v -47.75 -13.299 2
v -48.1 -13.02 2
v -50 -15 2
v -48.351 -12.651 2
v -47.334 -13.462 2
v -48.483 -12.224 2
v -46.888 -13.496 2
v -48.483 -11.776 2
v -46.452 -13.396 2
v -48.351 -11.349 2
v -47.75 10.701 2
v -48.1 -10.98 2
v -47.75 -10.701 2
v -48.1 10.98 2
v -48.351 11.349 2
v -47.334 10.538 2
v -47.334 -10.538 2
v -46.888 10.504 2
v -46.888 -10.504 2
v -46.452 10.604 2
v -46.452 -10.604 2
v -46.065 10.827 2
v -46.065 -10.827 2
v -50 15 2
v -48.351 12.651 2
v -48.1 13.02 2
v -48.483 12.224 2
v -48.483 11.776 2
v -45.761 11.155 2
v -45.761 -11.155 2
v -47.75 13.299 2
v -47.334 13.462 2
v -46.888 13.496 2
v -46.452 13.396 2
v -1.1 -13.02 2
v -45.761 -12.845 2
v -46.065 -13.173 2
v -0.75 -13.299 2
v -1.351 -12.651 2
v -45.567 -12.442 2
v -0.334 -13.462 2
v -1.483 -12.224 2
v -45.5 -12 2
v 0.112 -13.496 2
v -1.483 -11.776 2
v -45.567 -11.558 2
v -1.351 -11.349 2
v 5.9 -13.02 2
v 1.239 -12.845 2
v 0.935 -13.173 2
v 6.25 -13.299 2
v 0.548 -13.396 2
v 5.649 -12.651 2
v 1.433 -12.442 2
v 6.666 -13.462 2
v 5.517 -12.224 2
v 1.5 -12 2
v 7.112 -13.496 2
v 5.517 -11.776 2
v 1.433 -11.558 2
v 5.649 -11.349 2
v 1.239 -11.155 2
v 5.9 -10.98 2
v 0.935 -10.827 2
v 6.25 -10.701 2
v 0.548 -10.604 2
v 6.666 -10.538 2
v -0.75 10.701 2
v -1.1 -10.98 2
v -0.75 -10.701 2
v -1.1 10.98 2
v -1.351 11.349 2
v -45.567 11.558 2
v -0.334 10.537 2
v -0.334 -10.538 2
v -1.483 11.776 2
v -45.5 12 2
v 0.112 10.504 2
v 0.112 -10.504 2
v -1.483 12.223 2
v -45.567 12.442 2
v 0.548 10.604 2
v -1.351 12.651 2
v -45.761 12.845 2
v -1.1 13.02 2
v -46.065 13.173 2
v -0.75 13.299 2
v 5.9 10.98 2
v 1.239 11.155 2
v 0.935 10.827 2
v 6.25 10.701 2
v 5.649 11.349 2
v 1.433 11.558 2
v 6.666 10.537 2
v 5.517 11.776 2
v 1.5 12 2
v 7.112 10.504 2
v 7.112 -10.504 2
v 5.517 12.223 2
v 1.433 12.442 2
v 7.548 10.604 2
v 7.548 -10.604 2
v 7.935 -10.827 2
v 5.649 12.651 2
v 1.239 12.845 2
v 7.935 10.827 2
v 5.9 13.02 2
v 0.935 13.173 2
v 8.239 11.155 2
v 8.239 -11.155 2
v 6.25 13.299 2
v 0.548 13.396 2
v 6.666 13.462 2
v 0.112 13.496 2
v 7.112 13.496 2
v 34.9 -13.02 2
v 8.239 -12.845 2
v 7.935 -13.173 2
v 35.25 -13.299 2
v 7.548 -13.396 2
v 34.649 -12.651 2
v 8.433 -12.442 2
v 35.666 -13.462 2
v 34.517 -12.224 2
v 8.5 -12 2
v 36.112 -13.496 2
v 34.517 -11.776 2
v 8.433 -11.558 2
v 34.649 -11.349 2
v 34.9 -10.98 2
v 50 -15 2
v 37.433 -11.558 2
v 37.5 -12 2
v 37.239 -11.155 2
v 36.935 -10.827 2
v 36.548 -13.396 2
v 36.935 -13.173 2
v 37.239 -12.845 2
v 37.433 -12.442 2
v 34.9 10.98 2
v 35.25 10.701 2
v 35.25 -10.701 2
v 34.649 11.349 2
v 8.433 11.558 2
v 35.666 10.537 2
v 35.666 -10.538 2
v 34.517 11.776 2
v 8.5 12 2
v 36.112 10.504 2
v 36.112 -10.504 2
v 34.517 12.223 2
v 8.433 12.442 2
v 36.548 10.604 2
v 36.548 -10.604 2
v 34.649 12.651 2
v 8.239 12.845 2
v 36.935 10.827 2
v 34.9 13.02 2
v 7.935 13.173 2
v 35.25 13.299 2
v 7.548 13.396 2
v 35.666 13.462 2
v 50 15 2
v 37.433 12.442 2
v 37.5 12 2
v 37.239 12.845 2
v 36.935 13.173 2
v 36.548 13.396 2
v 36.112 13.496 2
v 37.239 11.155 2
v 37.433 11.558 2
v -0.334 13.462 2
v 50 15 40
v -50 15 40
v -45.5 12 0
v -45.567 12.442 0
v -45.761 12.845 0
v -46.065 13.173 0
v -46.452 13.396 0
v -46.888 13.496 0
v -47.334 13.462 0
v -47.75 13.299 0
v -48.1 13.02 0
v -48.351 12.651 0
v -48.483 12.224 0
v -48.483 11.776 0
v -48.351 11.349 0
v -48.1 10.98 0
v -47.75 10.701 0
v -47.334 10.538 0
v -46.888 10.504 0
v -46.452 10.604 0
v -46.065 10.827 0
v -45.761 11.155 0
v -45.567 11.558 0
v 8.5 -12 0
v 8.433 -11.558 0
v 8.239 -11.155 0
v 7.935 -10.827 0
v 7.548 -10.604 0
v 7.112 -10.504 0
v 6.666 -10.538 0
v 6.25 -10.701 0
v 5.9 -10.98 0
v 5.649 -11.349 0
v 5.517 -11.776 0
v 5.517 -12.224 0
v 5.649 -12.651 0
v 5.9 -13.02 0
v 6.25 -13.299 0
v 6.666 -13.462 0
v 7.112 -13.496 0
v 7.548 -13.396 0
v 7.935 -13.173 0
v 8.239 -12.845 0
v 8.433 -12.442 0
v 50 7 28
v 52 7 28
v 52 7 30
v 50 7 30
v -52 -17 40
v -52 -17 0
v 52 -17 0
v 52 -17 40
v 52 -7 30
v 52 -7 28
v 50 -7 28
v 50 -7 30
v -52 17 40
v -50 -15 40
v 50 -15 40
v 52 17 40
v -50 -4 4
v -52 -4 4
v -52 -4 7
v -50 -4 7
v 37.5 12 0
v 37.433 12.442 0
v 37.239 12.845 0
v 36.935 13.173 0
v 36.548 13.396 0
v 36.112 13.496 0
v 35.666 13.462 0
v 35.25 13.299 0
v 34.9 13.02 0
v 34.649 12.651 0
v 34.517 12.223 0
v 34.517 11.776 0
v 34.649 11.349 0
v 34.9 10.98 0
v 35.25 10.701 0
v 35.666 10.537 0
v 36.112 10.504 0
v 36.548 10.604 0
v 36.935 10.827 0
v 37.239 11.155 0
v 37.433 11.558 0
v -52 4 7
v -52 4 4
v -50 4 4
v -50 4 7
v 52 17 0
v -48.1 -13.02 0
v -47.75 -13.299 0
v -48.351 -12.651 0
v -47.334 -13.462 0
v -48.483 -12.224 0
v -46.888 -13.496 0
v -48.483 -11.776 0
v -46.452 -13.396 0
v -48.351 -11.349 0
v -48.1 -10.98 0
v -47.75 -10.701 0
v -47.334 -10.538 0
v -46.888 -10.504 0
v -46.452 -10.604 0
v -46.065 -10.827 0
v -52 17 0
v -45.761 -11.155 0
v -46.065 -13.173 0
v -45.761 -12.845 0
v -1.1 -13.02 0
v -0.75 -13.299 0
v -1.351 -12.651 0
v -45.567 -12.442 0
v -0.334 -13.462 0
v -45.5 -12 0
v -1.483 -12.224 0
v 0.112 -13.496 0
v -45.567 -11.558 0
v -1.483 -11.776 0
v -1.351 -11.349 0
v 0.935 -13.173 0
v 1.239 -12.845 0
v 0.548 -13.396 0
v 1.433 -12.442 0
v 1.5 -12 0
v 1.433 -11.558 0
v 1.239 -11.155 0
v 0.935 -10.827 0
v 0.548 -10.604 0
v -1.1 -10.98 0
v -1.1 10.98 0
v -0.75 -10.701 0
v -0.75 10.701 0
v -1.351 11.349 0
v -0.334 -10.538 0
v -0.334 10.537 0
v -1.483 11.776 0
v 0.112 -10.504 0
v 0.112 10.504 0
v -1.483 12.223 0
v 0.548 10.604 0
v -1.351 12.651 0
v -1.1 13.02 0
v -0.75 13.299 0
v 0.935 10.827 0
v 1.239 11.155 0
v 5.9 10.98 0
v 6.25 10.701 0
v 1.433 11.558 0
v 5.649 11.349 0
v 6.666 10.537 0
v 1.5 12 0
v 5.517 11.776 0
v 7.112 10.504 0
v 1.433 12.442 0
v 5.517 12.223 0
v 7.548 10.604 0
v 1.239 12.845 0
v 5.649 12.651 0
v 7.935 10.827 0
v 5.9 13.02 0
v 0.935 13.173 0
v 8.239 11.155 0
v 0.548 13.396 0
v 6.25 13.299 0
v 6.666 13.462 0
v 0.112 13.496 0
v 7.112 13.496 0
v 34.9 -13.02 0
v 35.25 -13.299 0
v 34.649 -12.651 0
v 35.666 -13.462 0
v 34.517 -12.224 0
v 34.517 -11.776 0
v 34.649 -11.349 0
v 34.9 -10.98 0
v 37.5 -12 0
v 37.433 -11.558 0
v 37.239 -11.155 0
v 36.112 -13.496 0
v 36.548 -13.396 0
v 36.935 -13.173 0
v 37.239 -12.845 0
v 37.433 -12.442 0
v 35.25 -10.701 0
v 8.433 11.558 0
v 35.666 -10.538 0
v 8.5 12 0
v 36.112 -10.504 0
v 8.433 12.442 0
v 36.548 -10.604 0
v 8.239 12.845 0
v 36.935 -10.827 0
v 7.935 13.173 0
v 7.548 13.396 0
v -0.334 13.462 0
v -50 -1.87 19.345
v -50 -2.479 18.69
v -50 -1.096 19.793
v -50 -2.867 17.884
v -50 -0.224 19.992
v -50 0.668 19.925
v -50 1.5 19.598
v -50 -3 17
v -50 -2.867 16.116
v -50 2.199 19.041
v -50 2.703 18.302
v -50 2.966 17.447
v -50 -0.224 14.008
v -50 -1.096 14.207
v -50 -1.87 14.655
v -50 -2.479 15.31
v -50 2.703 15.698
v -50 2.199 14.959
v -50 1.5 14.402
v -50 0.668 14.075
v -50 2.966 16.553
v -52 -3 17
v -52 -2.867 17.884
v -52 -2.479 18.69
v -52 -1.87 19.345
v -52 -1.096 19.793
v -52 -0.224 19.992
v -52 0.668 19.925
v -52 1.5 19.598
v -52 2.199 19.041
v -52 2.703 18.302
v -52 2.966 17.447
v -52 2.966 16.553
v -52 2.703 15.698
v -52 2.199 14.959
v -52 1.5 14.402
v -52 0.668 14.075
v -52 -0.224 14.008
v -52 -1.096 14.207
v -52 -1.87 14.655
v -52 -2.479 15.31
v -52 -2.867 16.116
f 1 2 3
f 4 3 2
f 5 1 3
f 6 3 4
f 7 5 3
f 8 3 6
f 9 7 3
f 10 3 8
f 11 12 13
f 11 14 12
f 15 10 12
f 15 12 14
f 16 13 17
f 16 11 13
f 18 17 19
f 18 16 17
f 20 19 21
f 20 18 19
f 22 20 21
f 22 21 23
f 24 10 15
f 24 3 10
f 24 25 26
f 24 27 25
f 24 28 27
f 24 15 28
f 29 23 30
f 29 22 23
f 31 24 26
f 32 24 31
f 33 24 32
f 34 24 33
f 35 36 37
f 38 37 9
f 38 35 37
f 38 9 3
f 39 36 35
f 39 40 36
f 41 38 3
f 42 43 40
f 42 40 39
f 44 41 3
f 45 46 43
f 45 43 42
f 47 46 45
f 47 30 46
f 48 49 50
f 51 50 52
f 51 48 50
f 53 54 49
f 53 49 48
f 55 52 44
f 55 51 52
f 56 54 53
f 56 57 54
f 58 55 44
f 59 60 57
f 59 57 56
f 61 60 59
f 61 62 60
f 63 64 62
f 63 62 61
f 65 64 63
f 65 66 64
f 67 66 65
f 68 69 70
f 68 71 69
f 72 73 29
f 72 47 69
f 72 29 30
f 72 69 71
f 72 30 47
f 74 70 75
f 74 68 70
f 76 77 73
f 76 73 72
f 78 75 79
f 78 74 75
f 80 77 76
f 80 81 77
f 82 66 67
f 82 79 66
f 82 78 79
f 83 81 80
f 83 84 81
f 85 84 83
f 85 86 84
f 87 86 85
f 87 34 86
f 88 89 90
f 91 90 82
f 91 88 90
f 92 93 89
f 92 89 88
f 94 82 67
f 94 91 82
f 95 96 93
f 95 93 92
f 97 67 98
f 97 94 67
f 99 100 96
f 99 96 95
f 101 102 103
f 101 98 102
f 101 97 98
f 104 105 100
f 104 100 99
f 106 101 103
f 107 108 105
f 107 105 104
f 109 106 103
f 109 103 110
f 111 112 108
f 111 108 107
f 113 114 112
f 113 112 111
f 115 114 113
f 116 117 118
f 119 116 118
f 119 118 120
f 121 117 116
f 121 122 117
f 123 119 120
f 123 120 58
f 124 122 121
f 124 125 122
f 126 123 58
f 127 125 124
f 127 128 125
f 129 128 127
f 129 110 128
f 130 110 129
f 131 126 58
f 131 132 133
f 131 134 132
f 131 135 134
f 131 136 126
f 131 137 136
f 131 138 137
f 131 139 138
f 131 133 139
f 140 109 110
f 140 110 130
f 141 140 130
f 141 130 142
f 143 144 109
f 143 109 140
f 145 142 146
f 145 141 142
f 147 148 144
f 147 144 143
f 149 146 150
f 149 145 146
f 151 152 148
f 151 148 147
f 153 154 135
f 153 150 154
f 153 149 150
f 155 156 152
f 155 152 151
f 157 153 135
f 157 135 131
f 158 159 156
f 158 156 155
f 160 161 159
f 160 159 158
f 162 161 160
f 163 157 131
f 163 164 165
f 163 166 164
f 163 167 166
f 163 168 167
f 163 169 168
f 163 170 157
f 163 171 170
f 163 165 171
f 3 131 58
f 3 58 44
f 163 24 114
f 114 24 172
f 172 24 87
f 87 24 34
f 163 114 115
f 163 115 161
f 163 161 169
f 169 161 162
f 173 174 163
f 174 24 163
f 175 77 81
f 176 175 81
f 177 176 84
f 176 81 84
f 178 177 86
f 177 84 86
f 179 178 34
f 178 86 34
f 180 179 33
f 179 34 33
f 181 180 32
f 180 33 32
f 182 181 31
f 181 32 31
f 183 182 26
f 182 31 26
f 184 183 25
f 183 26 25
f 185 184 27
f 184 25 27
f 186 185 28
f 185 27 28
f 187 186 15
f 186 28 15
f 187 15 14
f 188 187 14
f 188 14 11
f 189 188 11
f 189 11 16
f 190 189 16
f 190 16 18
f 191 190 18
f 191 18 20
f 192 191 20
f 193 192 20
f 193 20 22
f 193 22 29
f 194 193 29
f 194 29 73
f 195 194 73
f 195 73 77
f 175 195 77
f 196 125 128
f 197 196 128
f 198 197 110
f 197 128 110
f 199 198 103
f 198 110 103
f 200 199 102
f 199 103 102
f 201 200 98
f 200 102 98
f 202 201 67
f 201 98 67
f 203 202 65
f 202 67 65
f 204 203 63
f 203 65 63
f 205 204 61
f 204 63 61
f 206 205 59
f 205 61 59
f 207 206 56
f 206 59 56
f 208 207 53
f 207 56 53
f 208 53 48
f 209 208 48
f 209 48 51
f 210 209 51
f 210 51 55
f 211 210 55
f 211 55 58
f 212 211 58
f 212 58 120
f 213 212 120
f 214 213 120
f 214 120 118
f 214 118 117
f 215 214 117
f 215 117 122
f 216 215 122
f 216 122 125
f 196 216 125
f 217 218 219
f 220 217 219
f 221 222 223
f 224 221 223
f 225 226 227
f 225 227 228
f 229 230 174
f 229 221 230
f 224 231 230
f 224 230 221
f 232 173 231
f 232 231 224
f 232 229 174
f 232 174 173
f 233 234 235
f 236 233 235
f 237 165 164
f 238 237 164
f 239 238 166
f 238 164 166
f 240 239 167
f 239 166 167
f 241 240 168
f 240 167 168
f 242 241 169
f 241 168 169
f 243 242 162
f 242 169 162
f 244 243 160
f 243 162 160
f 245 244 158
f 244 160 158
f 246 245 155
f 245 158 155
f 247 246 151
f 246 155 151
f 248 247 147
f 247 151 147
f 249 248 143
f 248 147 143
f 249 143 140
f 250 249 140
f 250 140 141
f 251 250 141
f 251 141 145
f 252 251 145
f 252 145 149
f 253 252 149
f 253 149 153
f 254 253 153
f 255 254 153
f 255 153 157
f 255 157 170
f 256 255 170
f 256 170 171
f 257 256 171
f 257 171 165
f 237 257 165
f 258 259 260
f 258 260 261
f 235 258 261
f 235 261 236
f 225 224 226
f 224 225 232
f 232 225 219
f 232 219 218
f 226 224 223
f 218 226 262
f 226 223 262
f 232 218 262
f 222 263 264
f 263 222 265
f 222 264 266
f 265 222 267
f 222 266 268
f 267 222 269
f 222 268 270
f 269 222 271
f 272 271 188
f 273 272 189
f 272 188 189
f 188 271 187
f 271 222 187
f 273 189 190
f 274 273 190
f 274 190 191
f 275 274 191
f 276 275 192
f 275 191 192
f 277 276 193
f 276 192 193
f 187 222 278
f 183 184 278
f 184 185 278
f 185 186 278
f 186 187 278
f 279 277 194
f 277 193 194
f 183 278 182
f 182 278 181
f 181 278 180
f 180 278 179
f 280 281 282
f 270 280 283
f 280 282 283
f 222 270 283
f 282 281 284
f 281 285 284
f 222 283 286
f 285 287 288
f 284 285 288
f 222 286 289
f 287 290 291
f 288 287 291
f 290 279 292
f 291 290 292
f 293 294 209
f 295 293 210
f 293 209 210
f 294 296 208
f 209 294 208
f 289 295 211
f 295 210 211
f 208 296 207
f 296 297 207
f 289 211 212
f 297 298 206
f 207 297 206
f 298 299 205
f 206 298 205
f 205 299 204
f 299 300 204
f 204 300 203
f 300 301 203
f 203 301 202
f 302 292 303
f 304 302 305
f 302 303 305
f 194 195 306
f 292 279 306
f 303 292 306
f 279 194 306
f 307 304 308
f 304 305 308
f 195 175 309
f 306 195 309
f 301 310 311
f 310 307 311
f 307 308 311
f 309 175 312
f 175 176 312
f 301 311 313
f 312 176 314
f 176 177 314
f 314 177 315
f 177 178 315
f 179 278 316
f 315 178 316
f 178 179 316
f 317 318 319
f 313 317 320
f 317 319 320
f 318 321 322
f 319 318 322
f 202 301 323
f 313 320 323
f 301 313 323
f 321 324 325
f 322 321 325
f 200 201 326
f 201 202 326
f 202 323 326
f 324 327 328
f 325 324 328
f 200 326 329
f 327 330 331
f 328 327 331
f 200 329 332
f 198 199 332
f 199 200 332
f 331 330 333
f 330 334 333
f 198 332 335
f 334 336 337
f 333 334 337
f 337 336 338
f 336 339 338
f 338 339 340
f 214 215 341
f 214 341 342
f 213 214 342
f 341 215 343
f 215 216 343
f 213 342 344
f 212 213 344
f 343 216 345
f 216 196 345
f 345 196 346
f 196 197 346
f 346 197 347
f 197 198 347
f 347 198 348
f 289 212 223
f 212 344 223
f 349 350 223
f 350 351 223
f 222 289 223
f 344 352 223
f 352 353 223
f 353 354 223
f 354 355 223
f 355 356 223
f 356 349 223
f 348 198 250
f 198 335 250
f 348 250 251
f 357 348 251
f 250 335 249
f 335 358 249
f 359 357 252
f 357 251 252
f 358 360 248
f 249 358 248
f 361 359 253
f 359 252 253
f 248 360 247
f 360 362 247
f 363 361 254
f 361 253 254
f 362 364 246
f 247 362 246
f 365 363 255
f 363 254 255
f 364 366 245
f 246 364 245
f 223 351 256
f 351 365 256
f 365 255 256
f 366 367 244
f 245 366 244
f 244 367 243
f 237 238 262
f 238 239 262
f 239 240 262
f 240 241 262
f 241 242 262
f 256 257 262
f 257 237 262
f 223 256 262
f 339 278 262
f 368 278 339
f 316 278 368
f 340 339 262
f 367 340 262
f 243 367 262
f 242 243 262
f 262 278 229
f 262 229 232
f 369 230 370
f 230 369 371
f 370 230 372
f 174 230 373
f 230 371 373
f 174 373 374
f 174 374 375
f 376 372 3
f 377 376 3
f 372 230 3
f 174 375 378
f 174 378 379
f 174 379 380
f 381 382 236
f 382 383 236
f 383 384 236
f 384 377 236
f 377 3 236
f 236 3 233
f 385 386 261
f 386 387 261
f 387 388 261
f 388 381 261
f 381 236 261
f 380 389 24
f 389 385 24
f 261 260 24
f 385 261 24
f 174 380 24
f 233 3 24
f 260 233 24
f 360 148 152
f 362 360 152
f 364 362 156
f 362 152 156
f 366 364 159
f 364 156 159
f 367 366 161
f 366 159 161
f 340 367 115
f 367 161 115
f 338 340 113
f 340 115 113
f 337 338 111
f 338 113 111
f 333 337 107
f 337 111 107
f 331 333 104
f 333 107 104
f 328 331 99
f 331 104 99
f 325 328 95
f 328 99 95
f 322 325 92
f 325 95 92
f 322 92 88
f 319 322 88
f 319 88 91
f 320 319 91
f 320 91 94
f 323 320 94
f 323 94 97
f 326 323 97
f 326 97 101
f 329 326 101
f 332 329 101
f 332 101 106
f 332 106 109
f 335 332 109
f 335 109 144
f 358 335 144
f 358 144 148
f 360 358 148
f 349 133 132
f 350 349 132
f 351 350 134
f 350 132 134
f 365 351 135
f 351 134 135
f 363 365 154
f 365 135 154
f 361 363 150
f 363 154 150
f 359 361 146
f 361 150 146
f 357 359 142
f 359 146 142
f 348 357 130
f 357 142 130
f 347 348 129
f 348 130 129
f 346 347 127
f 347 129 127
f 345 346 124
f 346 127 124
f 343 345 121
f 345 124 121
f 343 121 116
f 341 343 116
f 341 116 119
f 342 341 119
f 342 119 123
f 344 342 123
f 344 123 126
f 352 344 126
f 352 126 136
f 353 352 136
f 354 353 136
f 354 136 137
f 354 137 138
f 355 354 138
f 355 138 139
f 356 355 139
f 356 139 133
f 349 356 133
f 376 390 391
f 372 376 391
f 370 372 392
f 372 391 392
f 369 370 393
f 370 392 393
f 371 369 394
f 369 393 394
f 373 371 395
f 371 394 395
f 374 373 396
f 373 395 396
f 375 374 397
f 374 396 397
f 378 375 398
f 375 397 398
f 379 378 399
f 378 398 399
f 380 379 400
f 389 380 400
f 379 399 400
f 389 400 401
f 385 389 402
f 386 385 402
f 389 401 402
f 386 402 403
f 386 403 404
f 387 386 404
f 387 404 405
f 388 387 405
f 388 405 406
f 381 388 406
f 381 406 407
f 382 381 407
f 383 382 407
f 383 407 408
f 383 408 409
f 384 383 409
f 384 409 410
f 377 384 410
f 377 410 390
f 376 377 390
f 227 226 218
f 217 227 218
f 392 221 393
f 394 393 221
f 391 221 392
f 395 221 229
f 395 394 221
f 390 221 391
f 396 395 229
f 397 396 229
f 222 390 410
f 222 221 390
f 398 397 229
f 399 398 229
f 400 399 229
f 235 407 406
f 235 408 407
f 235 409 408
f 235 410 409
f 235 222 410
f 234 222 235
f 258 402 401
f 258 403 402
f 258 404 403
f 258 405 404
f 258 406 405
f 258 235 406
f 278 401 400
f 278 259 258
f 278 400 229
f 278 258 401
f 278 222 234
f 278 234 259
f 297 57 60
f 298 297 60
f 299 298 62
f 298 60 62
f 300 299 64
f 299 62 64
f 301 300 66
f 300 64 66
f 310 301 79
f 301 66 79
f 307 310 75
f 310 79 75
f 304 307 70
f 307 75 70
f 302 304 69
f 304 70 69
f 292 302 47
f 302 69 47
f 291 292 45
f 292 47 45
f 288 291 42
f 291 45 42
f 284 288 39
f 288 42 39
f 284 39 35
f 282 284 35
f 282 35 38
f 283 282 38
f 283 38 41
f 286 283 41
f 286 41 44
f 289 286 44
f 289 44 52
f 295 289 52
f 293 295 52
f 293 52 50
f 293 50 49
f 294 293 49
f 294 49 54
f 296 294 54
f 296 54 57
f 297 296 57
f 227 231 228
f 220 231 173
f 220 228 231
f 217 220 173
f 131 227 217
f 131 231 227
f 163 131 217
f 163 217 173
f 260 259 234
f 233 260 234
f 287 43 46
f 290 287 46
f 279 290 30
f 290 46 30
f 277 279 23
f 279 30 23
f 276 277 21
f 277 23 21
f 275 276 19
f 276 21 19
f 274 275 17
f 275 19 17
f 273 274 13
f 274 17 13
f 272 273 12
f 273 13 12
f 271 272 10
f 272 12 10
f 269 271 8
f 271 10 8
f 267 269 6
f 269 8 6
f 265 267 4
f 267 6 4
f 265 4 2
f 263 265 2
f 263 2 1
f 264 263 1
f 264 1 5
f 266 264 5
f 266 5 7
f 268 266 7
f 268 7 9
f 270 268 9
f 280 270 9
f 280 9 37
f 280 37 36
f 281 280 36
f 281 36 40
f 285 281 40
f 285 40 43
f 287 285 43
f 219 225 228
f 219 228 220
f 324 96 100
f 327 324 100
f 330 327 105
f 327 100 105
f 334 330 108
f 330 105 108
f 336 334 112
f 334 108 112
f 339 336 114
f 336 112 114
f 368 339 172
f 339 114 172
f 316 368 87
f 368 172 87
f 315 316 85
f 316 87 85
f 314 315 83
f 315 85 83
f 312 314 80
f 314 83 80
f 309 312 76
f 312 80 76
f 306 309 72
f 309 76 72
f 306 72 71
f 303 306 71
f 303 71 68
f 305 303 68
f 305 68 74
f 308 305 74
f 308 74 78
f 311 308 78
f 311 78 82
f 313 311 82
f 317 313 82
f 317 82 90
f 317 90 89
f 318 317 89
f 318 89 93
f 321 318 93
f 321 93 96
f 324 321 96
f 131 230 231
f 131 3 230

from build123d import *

# Parameters (mm, degrees)
PAD_DEPTH       = 3
SKETCH001_R     = 1.5
POCKET_DEPTH    = 5
SKETCH002_W     = 104
SKETCH002_H     = 34
PAD001_DEPTH    = 40
THICKNESS_T     = -2
POCKET001_DEPTH = 5
SKETCH003_R     = 3
SKETCH003_W     = 8
SKETCH003_H     = 3
POCKET002_DEPTH = 5
SKETCH004_W     = 14
SKETCH004_H     = 2
POCKET003_DEPTH = 5


with BuildPart() as part:
    # Sketch → Pad (new body)
    with BuildSketch(Plane.XY):
        Polygon((-50, 15), (-50, -15), (50, -15), (50, 14.99989), align=None)
    extrude(amount=PAD_DEPTH)

    # Sketch001 (on Face6 of Pad) → Pocket (cut)
    with BuildSketch(Plane.XY.offset(3)):
        with Locations((-47, 12)):
            Circle(SKETCH001_R)
        with Locations((-47, -12)):
            Circle(SKETCH001_R)
        with Locations((0, 11.99989)):
            Circle(SKETCH001_R)
        with Locations((0, -12)):
            Circle(SKETCH001_R)
        with Locations((7, 11.99989)):
            Circle(SKETCH001_R)
        with Locations((7, -12)):
            Circle(SKETCH001_R)
        with Locations((36, 11.99989)):
            Circle(SKETCH001_R)
        with Locations((36, -12)):
            Circle(SKETCH001_R)
    extrude(amount=-POCKET_DEPTH, mode=Mode.SUBTRACT)

    # Sketch002 → Pad001 (join)
    with BuildSketch(Plane.XY):
        Rectangle(SKETCH002_W, SKETCH002_H)
    extrude(amount=PAD001_DEPTH)

    # Thickness
    thickness_openings = [part.faces().sort_by_distance(p)[0] for p in [
        (0, 0, 40),
    ]]
    offset(amount=THICKNESS_T, openings=thickness_openings)

    # Sketch001 (on Face6 of Pad) → Pocket001 (cut)
    with BuildSketch(Plane.XY.offset(3)):
        with Locations((-47, 12)):
            Circle(SKETCH001_R)
        with Locations((-47, -12)):
            Circle(SKETCH001_R)
        with Locations((0, 11.99989)):
            Circle(SKETCH001_R)
        with Locations((0, -12)):
            Circle(SKETCH001_R)
        with Locations((7, 11.99989)):
            Circle(SKETCH001_R)
        with Locations((7, -12)):
            Circle(SKETCH001_R)
        with Locations((36, 11.99989)):
            Circle(SKETCH001_R)
        with Locations((36, -12)):
            Circle(SKETCH001_R)
    extrude(amount=-POCKET001_DEPTH, mode=Mode.SUBTRACT)

    # Sketch003 (on Face1 of Pocket001) → Pocket002 (cut)
    with BuildSketch(Plane(origin=(-52, 0, 0), x_dir=(0, -1, 0), z_dir=(-1, 0, 0))):
        with Locations((0, 17)):
            Circle(SKETCH003_R)
        with Locations((0, 5.5)):
            Rectangle(SKETCH003_W, SKETCH003_H)
    extrude(amount=-POCKET002_DEPTH, mode=Mode.SUBTRACT)

    # Sketch004 (on Face11 of Pocket002) → Pocket003 (cut)
    with BuildSketch(Plane.YZ.offset(52)):
        with Locations((0, 29)):
            Rectangle(SKETCH004_W, SKETCH004_H)
    extrude(amount=-POCKET003_DEPTH, mode=Mode.SUBTRACT)


solid = part.part
